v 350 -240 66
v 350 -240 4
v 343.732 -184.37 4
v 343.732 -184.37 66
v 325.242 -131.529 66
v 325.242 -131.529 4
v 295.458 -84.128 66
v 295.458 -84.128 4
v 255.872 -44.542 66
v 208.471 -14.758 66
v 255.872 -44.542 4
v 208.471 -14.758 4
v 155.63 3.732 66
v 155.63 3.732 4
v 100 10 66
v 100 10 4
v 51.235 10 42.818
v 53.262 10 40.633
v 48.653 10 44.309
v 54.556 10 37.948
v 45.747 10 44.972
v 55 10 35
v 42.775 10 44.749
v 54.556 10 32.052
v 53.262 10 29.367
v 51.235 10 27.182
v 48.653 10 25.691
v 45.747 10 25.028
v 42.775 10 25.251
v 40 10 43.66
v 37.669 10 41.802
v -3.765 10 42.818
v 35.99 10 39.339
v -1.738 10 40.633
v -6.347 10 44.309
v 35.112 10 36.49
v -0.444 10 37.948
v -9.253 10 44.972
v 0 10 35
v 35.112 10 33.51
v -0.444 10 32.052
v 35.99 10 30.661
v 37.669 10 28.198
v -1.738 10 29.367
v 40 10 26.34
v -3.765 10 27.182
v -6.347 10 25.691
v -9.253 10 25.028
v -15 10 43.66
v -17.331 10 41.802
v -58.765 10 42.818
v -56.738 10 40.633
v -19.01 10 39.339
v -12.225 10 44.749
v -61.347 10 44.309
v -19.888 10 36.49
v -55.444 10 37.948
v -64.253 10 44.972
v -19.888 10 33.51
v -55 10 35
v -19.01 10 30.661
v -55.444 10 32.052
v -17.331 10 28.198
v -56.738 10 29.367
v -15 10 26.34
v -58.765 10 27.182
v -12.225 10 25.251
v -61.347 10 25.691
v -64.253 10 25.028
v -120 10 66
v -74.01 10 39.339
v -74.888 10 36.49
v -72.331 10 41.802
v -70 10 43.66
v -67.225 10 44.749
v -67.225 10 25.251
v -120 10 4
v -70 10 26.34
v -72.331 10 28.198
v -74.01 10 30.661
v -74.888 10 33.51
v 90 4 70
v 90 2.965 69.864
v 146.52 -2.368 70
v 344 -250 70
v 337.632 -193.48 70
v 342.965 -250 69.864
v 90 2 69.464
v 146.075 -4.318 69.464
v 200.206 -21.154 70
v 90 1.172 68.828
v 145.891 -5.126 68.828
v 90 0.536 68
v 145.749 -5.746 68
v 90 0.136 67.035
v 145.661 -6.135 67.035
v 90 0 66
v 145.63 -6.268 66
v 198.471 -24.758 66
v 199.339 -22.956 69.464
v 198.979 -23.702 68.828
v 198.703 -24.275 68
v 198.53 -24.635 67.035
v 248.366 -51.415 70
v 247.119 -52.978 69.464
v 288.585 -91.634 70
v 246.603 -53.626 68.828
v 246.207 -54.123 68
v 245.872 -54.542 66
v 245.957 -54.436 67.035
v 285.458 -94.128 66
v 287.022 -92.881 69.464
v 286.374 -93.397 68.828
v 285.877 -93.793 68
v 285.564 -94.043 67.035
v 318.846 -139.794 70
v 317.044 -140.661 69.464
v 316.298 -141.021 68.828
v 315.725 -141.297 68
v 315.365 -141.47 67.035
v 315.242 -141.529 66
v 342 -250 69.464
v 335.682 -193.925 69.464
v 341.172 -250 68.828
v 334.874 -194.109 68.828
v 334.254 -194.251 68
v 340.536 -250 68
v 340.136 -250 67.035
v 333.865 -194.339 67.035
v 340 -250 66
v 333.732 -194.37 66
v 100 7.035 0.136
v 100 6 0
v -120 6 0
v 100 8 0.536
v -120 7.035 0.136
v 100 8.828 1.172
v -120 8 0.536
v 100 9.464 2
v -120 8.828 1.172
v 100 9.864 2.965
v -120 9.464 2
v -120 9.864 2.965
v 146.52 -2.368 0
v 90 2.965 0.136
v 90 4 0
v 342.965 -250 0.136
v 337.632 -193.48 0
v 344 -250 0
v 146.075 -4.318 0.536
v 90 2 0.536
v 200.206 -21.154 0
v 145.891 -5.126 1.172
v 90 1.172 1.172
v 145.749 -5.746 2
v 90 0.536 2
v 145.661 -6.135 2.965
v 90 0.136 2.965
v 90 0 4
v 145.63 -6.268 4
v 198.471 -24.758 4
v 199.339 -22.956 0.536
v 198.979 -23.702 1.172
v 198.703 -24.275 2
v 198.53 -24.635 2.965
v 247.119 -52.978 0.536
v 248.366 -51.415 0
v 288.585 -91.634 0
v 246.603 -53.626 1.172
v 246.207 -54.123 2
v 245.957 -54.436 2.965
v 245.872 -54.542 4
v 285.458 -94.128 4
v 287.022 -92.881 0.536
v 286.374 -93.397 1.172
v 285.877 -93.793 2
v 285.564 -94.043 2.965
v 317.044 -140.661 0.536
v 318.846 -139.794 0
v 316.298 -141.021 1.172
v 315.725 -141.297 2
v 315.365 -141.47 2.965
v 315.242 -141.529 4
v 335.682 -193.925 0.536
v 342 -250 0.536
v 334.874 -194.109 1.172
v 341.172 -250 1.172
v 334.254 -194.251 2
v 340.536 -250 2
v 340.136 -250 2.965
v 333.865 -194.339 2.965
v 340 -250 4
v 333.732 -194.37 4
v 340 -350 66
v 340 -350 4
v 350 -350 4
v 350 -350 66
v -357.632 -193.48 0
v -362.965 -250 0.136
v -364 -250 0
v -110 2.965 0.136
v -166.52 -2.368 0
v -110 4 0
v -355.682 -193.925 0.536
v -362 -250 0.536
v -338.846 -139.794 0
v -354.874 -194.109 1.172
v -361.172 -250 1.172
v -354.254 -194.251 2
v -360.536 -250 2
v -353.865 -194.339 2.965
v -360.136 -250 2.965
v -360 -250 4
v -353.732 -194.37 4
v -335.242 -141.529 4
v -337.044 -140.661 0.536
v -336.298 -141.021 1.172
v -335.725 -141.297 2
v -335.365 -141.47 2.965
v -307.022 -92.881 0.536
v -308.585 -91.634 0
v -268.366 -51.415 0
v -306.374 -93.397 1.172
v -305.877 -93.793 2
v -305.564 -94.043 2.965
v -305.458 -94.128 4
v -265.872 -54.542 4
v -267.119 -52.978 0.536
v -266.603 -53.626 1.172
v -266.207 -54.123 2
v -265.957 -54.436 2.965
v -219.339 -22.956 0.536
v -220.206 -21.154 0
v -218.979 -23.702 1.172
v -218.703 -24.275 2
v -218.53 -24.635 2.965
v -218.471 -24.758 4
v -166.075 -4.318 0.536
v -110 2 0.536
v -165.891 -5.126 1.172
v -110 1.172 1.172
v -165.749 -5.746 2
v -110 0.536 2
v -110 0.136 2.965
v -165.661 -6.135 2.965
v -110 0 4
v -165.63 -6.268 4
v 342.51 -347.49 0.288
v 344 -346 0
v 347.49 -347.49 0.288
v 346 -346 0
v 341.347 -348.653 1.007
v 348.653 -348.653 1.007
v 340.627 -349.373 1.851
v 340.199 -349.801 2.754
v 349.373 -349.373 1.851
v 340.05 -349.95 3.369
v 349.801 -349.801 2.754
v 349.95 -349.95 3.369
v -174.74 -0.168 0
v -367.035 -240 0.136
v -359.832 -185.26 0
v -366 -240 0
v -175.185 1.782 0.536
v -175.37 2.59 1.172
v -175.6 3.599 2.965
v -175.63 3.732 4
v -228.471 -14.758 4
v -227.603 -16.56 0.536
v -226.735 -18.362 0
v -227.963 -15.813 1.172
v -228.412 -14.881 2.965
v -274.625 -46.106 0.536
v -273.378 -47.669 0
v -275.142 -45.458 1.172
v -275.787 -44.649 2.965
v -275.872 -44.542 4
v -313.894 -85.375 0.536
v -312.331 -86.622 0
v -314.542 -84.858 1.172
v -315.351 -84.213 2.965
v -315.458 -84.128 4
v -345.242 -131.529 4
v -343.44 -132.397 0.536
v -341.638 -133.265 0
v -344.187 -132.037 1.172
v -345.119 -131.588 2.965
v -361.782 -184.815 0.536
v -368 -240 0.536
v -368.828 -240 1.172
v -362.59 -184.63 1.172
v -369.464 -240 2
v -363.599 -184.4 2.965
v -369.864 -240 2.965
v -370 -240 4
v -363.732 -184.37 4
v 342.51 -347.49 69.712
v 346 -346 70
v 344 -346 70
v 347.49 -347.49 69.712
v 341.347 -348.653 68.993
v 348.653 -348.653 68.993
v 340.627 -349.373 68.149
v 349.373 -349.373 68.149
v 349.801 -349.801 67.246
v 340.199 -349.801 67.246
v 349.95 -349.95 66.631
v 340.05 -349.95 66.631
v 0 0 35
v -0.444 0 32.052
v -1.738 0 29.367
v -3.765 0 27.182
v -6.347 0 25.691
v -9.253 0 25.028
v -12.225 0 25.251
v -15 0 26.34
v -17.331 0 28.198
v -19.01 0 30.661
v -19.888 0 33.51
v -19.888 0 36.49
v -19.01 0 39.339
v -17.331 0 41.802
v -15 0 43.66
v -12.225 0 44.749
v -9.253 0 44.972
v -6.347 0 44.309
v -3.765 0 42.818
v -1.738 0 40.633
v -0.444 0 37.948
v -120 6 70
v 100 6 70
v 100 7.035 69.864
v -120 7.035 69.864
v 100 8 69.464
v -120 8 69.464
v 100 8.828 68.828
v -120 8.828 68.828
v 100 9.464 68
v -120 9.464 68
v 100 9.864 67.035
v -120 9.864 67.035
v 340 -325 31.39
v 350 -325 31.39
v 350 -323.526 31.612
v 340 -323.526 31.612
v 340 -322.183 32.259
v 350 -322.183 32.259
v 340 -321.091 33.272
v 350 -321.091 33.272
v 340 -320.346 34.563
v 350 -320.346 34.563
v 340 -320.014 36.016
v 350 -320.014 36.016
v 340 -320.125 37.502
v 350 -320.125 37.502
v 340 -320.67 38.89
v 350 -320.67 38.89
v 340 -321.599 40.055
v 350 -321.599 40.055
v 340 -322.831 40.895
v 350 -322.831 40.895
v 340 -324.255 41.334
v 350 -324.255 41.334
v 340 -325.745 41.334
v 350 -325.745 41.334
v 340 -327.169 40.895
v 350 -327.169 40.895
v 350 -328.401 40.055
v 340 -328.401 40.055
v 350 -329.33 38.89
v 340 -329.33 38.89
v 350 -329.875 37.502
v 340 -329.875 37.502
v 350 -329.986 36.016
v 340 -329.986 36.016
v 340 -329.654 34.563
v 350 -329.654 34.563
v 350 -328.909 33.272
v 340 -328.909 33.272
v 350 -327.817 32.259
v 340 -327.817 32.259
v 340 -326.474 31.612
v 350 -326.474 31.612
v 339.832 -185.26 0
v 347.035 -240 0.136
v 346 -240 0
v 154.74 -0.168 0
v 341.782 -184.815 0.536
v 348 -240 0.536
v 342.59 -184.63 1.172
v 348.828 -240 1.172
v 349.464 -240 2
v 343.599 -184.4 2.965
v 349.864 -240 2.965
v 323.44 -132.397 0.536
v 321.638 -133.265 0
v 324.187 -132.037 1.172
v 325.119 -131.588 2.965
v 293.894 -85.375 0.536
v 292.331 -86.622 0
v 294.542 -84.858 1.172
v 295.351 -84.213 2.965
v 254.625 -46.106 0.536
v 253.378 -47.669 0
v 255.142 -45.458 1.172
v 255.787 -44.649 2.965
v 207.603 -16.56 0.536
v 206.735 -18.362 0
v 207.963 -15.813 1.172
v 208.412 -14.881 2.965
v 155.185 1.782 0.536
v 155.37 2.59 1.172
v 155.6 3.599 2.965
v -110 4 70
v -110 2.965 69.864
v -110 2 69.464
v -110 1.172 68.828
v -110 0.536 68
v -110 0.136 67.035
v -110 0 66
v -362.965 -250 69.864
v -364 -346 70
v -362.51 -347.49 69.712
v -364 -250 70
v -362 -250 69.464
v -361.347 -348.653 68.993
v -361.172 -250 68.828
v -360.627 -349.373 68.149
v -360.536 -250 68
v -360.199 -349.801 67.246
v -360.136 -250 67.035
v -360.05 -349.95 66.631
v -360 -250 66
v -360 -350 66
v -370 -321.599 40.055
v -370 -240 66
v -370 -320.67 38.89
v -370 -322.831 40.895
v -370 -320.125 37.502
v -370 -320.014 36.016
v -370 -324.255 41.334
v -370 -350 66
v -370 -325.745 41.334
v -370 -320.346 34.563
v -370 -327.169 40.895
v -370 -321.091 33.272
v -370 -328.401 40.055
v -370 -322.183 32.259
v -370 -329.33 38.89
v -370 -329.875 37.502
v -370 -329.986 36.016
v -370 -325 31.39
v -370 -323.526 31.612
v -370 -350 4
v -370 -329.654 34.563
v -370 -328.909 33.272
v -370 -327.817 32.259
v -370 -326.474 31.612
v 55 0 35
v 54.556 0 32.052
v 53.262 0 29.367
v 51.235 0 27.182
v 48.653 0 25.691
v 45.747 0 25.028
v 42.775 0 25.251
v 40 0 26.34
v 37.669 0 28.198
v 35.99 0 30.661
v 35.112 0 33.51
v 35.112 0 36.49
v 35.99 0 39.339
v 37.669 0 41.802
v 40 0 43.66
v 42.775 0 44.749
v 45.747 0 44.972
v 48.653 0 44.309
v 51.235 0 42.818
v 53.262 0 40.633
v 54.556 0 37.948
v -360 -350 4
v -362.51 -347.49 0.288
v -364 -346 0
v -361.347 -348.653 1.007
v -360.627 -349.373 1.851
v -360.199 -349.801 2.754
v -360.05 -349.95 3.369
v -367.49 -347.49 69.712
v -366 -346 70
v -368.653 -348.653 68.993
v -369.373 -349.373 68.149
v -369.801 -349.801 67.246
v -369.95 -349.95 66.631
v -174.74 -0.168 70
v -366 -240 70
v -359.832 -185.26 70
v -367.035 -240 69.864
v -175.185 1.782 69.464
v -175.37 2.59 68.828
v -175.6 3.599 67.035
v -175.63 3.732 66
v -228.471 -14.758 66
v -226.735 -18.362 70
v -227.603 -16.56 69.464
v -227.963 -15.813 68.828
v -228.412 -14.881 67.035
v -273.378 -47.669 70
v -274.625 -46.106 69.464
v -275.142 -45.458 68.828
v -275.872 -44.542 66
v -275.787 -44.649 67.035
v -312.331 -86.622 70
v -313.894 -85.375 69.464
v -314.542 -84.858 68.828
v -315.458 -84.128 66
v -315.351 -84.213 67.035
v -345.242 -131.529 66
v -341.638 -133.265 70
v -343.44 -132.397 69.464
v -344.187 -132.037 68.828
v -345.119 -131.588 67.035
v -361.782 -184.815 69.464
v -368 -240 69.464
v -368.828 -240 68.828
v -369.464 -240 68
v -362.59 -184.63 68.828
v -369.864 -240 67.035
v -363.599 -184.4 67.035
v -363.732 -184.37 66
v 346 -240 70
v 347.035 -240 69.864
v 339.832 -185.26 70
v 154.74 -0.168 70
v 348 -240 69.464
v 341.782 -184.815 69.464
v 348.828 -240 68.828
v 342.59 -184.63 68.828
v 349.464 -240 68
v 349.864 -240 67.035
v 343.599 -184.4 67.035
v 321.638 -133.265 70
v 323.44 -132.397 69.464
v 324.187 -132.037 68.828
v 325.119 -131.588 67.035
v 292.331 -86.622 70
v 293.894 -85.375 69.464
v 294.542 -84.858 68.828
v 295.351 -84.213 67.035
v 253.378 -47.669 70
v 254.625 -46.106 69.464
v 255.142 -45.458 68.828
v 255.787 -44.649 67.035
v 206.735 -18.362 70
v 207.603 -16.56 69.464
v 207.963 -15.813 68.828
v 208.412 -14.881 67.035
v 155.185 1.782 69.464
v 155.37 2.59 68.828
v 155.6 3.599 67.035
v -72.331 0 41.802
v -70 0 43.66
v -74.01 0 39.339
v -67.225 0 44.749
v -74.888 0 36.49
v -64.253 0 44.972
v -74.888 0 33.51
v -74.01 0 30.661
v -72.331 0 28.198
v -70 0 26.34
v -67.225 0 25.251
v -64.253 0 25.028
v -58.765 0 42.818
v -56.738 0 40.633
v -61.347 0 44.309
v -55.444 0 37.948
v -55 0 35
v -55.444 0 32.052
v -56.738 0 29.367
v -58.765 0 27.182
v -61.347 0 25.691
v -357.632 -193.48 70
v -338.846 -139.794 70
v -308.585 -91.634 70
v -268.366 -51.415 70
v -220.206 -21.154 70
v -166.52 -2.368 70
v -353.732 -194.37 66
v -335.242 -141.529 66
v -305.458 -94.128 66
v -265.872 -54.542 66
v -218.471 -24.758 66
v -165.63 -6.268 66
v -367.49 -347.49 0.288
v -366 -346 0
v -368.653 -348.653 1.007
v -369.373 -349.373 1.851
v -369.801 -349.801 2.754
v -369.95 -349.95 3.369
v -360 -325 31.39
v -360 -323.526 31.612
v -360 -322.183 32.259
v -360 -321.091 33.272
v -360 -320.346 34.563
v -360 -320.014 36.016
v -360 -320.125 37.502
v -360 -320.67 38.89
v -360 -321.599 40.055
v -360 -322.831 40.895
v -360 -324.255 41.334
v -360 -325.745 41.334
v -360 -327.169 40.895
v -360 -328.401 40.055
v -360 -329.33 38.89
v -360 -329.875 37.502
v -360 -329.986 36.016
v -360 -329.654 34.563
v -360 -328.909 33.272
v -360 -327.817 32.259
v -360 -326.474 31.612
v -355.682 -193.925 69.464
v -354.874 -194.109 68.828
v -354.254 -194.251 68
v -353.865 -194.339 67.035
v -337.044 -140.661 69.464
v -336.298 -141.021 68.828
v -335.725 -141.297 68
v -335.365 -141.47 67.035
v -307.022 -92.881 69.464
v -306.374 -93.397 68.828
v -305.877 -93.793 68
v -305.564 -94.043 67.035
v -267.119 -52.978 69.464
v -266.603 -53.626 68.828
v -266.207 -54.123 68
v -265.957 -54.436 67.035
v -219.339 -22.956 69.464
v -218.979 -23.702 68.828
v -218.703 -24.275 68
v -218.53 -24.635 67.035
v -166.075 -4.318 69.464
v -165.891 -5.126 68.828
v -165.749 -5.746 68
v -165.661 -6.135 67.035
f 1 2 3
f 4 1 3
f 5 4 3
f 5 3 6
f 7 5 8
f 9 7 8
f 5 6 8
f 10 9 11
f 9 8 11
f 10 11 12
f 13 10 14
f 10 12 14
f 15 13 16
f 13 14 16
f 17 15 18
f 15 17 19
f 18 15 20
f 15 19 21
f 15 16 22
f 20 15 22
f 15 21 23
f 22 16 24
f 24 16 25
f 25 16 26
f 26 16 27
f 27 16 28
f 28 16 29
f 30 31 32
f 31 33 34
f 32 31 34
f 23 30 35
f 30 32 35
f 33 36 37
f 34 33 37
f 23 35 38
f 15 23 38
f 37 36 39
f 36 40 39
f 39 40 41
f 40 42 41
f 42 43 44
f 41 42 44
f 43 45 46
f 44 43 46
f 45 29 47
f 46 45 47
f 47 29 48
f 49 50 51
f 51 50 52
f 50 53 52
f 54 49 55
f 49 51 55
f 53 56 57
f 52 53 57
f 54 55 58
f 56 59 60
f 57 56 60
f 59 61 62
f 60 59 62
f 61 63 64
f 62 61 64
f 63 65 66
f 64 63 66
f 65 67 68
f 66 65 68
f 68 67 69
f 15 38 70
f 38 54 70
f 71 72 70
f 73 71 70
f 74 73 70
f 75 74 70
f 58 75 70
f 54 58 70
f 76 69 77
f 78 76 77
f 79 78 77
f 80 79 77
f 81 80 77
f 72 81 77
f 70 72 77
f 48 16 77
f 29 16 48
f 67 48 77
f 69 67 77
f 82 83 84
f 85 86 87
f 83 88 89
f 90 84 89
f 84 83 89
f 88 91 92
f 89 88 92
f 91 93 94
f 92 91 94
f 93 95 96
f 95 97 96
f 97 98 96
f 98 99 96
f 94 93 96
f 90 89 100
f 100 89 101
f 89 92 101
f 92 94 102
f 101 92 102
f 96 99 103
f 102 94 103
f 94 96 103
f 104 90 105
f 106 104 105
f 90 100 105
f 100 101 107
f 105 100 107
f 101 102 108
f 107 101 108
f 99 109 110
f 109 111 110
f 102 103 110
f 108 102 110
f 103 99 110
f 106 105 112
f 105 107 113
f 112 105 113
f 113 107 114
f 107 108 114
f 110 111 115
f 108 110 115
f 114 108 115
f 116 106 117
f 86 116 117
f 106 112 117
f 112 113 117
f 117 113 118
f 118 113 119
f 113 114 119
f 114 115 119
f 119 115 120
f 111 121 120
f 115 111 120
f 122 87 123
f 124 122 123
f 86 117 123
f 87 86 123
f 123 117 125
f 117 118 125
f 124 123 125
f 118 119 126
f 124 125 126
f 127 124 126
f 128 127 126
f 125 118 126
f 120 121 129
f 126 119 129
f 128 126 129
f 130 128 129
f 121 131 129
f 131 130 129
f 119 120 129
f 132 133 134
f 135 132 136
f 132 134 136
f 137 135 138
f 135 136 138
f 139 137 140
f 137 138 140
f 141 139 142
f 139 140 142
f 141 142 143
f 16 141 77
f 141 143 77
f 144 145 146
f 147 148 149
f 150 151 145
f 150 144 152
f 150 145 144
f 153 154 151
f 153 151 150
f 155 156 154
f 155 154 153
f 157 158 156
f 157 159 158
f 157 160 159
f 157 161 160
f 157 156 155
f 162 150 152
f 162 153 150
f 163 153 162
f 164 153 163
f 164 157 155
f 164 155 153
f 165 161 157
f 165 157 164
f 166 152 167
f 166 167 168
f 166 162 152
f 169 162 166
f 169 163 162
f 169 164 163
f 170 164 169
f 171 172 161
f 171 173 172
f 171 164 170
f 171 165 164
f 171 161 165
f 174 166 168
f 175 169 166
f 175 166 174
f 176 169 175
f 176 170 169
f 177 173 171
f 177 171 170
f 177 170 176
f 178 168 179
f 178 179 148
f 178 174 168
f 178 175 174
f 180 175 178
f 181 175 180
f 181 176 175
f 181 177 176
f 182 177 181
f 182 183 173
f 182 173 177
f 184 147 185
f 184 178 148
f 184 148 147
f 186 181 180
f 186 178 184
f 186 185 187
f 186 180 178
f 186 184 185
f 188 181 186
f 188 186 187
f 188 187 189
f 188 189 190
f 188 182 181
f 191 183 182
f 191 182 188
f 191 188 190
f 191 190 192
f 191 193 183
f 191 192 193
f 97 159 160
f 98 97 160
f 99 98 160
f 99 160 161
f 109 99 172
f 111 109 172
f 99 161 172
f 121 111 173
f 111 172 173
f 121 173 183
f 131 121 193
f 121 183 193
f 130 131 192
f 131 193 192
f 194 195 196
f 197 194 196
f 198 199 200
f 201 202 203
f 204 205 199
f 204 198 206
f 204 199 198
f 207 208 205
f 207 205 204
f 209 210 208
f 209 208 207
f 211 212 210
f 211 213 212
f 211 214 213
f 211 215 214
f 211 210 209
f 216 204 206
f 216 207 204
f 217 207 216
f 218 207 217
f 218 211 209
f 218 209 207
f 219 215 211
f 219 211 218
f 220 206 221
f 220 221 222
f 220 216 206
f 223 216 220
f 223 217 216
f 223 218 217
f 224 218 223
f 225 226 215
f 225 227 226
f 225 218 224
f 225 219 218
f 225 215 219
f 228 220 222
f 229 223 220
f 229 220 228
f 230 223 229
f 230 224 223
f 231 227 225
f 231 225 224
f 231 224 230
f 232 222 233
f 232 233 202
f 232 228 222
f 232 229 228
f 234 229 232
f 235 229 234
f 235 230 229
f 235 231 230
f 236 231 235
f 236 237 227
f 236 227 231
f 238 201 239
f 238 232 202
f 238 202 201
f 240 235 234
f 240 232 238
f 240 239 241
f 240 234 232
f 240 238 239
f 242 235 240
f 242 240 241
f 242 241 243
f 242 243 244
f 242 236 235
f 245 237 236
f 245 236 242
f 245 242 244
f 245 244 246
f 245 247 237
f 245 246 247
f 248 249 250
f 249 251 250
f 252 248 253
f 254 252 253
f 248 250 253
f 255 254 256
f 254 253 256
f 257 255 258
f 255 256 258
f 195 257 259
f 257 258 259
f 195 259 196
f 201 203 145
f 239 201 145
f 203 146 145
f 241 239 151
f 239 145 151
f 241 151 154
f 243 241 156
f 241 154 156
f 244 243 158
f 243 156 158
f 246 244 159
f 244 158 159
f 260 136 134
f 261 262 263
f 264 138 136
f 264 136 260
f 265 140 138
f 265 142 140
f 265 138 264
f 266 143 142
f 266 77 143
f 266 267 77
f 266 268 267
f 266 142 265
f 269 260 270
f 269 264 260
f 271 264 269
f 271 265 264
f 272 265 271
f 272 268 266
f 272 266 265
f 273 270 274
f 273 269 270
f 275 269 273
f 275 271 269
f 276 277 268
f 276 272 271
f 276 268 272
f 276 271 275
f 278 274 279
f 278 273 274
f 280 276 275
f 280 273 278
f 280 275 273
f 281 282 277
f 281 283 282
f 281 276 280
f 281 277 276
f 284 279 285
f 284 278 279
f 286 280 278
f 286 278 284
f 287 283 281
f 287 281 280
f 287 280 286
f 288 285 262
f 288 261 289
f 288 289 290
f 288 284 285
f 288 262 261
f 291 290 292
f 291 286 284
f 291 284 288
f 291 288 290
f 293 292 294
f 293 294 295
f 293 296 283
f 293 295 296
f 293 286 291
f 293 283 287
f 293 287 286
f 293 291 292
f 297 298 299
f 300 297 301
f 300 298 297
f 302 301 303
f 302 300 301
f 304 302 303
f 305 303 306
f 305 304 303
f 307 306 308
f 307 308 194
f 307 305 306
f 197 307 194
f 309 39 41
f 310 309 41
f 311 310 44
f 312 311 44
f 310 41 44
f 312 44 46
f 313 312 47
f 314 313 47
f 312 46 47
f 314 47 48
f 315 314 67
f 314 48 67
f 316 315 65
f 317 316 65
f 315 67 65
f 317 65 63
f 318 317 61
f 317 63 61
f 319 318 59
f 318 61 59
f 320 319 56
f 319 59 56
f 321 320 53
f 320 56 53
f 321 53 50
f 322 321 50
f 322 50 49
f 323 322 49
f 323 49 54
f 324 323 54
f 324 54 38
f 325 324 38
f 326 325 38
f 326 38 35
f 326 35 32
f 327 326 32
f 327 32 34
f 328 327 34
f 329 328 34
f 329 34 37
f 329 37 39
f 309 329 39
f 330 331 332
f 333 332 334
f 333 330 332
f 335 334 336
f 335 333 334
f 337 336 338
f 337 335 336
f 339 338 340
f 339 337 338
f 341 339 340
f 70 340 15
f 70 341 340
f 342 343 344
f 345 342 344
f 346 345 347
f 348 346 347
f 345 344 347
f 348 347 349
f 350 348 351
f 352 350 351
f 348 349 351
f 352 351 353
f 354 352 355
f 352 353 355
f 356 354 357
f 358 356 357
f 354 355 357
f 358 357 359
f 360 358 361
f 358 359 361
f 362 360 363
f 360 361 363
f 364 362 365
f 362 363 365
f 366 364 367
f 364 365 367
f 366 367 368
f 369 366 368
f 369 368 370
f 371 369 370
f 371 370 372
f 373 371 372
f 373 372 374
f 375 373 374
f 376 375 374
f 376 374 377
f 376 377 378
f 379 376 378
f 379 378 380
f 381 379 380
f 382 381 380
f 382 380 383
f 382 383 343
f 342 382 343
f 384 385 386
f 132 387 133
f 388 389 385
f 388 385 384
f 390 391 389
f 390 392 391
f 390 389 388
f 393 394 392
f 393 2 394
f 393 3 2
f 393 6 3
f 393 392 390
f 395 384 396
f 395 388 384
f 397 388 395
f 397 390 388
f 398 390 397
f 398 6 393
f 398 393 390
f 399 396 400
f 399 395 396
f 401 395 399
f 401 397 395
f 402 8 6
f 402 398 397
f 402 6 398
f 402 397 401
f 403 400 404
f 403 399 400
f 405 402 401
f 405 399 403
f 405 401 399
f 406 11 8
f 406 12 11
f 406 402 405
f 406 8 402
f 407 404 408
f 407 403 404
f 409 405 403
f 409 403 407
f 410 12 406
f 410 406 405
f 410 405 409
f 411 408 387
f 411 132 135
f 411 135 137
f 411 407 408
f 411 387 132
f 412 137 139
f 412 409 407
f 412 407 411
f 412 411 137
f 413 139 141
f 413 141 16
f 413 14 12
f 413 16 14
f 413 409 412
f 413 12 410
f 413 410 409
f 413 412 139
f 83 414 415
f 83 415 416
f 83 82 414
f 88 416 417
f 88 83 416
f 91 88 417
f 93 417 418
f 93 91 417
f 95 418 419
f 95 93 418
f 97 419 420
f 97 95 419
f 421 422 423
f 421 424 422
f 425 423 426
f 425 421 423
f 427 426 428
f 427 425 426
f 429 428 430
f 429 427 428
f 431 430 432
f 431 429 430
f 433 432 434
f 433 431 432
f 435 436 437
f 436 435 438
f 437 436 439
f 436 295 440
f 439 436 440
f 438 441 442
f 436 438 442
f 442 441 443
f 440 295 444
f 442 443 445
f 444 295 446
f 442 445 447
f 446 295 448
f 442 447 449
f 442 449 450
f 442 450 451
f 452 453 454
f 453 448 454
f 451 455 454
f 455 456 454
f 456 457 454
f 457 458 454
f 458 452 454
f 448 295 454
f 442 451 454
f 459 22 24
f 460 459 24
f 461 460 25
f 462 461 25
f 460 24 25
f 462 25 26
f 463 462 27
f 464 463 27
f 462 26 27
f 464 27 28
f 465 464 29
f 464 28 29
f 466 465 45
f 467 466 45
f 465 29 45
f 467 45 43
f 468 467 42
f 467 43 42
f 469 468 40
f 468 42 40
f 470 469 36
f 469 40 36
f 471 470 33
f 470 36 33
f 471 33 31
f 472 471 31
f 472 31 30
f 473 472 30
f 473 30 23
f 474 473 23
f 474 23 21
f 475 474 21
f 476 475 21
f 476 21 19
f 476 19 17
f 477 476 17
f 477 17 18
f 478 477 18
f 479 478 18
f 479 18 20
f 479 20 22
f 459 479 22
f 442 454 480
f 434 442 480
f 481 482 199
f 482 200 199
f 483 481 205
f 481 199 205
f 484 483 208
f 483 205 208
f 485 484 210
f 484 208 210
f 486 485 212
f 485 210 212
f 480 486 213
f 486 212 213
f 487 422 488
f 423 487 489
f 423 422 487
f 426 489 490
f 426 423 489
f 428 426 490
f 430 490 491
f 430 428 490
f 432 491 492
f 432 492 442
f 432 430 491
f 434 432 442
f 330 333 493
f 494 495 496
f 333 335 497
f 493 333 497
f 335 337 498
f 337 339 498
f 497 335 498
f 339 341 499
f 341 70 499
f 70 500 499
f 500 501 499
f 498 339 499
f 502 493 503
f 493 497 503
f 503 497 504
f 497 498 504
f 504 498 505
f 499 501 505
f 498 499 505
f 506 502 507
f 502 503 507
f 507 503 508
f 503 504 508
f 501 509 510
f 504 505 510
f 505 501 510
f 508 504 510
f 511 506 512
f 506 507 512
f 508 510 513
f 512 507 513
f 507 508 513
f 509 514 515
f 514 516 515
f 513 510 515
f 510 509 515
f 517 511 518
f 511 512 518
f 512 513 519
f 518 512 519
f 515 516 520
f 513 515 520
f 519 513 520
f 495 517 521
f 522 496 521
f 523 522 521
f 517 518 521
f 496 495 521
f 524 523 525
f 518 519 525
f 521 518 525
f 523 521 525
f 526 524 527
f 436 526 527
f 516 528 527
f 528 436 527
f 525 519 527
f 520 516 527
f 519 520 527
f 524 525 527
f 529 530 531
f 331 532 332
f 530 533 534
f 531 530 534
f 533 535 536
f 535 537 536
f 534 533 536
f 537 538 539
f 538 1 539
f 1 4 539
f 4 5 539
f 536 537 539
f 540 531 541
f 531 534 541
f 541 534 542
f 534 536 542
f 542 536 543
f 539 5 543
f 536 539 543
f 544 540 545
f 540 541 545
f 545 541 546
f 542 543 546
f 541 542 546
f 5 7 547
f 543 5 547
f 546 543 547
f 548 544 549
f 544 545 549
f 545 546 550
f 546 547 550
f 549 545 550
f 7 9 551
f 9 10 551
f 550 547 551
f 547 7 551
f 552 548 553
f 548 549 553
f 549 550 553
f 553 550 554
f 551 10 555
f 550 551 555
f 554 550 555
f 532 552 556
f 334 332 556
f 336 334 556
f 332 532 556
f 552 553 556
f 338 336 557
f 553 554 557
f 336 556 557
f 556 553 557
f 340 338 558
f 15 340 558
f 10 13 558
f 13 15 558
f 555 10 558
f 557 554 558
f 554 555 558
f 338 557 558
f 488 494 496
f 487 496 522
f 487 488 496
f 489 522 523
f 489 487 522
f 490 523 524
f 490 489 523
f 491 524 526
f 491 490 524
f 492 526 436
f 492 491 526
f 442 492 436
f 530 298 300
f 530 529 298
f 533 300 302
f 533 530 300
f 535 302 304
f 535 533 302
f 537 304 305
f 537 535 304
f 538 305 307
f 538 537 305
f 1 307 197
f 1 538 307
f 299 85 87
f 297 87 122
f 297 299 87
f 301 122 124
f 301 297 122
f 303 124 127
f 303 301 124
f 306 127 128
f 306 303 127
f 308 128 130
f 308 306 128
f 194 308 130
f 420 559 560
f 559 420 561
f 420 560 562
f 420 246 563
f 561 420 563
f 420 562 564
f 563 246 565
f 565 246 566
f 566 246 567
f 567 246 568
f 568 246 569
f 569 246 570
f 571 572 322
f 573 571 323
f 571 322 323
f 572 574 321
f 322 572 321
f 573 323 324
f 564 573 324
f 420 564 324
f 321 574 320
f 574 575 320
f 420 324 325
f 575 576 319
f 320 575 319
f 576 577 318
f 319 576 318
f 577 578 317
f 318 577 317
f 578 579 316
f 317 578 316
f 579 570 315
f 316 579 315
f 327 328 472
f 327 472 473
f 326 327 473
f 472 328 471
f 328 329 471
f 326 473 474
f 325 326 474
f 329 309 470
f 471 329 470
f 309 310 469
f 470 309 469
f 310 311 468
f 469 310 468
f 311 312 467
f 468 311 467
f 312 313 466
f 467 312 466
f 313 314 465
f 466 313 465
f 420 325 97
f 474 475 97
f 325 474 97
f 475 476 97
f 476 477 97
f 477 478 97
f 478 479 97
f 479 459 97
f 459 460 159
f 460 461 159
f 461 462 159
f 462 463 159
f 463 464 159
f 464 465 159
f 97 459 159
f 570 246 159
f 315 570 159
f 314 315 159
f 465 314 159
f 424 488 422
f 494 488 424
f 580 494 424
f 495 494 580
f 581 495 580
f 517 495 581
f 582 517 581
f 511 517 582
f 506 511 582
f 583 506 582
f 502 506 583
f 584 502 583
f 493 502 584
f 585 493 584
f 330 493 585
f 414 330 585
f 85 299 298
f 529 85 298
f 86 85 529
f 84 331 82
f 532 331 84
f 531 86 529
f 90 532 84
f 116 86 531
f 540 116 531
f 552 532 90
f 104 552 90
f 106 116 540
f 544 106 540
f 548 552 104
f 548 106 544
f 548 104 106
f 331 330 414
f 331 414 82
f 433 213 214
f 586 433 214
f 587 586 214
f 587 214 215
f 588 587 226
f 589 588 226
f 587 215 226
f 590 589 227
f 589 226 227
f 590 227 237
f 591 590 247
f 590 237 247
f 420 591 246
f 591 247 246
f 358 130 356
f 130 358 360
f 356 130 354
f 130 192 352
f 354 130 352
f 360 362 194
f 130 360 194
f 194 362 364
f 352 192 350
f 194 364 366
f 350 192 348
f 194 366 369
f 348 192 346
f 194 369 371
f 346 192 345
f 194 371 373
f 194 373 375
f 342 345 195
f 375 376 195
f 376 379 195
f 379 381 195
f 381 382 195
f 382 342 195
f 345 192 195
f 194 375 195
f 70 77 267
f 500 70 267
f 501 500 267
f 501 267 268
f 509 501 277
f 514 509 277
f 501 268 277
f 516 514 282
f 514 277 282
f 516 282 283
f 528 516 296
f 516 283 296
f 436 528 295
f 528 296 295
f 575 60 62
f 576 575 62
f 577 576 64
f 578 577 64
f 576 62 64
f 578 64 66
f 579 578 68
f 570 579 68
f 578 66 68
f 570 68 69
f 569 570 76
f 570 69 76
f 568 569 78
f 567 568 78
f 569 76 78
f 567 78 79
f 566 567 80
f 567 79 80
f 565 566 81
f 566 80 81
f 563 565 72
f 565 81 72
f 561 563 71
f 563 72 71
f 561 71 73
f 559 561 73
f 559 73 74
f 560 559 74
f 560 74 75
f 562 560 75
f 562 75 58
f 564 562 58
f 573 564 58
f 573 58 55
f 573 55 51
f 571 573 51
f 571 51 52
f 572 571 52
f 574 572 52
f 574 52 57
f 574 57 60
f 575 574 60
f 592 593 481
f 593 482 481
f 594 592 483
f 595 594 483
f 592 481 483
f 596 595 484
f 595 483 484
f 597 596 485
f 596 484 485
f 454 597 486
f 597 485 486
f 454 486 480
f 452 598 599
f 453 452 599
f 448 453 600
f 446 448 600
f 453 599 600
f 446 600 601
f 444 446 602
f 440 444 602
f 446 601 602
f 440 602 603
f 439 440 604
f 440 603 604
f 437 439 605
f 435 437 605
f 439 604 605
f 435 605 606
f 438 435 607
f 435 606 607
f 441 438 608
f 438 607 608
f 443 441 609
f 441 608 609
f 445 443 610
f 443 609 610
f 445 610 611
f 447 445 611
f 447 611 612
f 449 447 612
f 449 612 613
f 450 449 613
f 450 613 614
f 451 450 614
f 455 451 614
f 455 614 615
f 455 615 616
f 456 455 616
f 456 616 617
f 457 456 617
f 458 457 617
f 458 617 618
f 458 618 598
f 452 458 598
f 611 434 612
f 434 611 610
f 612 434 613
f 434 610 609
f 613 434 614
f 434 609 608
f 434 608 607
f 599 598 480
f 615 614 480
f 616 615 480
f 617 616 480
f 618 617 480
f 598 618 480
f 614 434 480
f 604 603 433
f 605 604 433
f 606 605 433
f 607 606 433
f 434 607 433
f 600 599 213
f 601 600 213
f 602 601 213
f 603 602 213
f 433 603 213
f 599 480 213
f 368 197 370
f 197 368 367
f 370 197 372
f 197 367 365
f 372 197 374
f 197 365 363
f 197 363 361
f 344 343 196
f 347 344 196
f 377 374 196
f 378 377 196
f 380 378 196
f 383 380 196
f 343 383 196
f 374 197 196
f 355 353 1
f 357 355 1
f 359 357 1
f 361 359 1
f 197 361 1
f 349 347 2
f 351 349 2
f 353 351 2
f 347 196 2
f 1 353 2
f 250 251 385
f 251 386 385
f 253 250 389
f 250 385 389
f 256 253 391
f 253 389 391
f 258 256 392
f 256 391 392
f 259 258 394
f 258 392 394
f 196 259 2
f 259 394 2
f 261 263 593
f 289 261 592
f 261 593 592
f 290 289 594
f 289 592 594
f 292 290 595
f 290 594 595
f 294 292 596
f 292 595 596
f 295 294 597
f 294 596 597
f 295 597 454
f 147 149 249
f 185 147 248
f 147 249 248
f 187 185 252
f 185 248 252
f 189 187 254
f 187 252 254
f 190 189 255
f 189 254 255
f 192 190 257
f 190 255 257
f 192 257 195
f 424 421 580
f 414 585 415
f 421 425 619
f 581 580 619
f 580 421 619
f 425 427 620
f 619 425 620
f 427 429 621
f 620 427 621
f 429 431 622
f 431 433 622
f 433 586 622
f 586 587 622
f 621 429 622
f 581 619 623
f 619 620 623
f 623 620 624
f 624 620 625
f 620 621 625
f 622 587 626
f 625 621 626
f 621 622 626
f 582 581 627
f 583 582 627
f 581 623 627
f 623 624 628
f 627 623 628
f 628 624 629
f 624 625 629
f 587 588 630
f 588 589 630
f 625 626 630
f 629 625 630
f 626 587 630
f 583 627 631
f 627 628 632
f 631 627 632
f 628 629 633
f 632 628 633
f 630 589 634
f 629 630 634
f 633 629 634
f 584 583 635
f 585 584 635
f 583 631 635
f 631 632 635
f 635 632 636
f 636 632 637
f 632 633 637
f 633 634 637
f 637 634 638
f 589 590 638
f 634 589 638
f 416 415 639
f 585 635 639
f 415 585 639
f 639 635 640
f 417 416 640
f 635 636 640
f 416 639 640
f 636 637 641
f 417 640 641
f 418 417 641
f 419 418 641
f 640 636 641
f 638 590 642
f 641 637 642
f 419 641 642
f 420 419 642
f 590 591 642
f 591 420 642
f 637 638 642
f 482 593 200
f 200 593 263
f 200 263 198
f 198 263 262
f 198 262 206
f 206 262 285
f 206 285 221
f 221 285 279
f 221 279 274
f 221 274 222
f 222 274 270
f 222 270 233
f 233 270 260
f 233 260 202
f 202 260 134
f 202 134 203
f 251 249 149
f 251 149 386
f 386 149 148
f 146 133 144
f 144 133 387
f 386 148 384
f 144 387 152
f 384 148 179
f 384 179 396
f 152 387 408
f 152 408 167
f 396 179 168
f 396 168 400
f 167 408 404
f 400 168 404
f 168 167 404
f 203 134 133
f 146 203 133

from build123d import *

# Parameters (mm, degrees)
BOSS_EXTRUDE1_DEPTH = 70
SKETCH2_R           = 5
CUT_EXTRUDE1_DEPTH  = 816
SKETCH3_R           = 10
CUT_EXTRUDE2_DEPTH  = 143
FILLET1_R           = 4


with BuildPart() as part:
    # Sketch1 → Boss-Extrude1 (new body)
    with BuildSketch(Plane.XY):
        with BuildLine():
            Line((-110, 0), (90, 0))
            ThreePointArc((90, 0), (266.776695297, -73.223304703), (340, -250))
            Line((340, -250), (340, -350))
            Line((340, -350), (350, -350))
            Line((350, -350), (350, -240))
            ThreePointArc((350, -240), (276.776695297, -63.223304703), (100, 10))
            Line((100, 10), (-120, 10))
            ThreePointArc((-120, 10), (-296.776695297, -63.223304703), (-370, -240))
            Line((-370, -240), (-370, -350))
            Line((-370, -350), (-360, -350))
            Line((-360, -350), (-360, -250))
            ThreePointArc((-360, -250), (-286.776695297, -73.223304703), (-110, 0))
        make_face()
    extrude(amount=BOSS_EXTRUDE1_DEPTH)

    # Sketch2 → Cut-Extrude1 (cut)
    with BuildSketch(Plane(origin=(350, 0, 0), x_dir=(0, 0, -1), z_dir=(1, 0, 0))):
        with Locations((-36.389856075, -325)):
            Circle(SKETCH2_R)
    extrude(amount=-CUT_EXTRUDE1_DEPTH, mode=Mode.SUBTRACT)

    # Sketch3 → Cut-Extrude2 (cut)
    with BuildSketch(Plane(origin=(0, 10, 0), x_dir=(1, 0, 0), z_dir=(0, 1, 0))):
        with Locations((-65, -35)):
            Circle(SKETCH3_R)
        with Locations((-10, -35)):
            Circle(SKETCH3_R)
        with Locations((45, -35)):
            Circle(SKETCH3_R)
    extrude(amount=-CUT_EXTRUDE2_DEPTH, mode=Mode.SUBTRACT)

    # Fillet1
    fillet1_edges = [part.edges().sort_by_distance(p)[0] for p in [
        (-296.776695297, -63.223304703, 70),
        (350, -295, 0),
        (345, -350, 0),
        (340, -300, 0),
        (266.776695297, -73.223304703, 0),
        (-10, 0, 0),
        (-286.776695297, -73.223304703, 0),
        (-370, -295, 70),
        (-360, -300, 0),
        (-365, -350, 0),
        (-370, -295, 0),
        (-296.776695297, -63.223304703, 0),
        (-10, 10, 0),
        (276.776695297, -63.223304703, 0),
        (-365, -350, 70),
        (-360, -300, 70),
        (-286.776695297, -73.223304703, 70),
        (-10, 0, 70),
        (266.776695297, -73.223304703, 70),
        (340, -300, 70),
        (345, -350, 70),
        (350, -295, 70),
        (276.776695297, -63.223304703, 70),
        (-10, 10, 70),
    ]]
    fillet(fillet1_edges, radius=FILLET1_R)


solid = part.part
